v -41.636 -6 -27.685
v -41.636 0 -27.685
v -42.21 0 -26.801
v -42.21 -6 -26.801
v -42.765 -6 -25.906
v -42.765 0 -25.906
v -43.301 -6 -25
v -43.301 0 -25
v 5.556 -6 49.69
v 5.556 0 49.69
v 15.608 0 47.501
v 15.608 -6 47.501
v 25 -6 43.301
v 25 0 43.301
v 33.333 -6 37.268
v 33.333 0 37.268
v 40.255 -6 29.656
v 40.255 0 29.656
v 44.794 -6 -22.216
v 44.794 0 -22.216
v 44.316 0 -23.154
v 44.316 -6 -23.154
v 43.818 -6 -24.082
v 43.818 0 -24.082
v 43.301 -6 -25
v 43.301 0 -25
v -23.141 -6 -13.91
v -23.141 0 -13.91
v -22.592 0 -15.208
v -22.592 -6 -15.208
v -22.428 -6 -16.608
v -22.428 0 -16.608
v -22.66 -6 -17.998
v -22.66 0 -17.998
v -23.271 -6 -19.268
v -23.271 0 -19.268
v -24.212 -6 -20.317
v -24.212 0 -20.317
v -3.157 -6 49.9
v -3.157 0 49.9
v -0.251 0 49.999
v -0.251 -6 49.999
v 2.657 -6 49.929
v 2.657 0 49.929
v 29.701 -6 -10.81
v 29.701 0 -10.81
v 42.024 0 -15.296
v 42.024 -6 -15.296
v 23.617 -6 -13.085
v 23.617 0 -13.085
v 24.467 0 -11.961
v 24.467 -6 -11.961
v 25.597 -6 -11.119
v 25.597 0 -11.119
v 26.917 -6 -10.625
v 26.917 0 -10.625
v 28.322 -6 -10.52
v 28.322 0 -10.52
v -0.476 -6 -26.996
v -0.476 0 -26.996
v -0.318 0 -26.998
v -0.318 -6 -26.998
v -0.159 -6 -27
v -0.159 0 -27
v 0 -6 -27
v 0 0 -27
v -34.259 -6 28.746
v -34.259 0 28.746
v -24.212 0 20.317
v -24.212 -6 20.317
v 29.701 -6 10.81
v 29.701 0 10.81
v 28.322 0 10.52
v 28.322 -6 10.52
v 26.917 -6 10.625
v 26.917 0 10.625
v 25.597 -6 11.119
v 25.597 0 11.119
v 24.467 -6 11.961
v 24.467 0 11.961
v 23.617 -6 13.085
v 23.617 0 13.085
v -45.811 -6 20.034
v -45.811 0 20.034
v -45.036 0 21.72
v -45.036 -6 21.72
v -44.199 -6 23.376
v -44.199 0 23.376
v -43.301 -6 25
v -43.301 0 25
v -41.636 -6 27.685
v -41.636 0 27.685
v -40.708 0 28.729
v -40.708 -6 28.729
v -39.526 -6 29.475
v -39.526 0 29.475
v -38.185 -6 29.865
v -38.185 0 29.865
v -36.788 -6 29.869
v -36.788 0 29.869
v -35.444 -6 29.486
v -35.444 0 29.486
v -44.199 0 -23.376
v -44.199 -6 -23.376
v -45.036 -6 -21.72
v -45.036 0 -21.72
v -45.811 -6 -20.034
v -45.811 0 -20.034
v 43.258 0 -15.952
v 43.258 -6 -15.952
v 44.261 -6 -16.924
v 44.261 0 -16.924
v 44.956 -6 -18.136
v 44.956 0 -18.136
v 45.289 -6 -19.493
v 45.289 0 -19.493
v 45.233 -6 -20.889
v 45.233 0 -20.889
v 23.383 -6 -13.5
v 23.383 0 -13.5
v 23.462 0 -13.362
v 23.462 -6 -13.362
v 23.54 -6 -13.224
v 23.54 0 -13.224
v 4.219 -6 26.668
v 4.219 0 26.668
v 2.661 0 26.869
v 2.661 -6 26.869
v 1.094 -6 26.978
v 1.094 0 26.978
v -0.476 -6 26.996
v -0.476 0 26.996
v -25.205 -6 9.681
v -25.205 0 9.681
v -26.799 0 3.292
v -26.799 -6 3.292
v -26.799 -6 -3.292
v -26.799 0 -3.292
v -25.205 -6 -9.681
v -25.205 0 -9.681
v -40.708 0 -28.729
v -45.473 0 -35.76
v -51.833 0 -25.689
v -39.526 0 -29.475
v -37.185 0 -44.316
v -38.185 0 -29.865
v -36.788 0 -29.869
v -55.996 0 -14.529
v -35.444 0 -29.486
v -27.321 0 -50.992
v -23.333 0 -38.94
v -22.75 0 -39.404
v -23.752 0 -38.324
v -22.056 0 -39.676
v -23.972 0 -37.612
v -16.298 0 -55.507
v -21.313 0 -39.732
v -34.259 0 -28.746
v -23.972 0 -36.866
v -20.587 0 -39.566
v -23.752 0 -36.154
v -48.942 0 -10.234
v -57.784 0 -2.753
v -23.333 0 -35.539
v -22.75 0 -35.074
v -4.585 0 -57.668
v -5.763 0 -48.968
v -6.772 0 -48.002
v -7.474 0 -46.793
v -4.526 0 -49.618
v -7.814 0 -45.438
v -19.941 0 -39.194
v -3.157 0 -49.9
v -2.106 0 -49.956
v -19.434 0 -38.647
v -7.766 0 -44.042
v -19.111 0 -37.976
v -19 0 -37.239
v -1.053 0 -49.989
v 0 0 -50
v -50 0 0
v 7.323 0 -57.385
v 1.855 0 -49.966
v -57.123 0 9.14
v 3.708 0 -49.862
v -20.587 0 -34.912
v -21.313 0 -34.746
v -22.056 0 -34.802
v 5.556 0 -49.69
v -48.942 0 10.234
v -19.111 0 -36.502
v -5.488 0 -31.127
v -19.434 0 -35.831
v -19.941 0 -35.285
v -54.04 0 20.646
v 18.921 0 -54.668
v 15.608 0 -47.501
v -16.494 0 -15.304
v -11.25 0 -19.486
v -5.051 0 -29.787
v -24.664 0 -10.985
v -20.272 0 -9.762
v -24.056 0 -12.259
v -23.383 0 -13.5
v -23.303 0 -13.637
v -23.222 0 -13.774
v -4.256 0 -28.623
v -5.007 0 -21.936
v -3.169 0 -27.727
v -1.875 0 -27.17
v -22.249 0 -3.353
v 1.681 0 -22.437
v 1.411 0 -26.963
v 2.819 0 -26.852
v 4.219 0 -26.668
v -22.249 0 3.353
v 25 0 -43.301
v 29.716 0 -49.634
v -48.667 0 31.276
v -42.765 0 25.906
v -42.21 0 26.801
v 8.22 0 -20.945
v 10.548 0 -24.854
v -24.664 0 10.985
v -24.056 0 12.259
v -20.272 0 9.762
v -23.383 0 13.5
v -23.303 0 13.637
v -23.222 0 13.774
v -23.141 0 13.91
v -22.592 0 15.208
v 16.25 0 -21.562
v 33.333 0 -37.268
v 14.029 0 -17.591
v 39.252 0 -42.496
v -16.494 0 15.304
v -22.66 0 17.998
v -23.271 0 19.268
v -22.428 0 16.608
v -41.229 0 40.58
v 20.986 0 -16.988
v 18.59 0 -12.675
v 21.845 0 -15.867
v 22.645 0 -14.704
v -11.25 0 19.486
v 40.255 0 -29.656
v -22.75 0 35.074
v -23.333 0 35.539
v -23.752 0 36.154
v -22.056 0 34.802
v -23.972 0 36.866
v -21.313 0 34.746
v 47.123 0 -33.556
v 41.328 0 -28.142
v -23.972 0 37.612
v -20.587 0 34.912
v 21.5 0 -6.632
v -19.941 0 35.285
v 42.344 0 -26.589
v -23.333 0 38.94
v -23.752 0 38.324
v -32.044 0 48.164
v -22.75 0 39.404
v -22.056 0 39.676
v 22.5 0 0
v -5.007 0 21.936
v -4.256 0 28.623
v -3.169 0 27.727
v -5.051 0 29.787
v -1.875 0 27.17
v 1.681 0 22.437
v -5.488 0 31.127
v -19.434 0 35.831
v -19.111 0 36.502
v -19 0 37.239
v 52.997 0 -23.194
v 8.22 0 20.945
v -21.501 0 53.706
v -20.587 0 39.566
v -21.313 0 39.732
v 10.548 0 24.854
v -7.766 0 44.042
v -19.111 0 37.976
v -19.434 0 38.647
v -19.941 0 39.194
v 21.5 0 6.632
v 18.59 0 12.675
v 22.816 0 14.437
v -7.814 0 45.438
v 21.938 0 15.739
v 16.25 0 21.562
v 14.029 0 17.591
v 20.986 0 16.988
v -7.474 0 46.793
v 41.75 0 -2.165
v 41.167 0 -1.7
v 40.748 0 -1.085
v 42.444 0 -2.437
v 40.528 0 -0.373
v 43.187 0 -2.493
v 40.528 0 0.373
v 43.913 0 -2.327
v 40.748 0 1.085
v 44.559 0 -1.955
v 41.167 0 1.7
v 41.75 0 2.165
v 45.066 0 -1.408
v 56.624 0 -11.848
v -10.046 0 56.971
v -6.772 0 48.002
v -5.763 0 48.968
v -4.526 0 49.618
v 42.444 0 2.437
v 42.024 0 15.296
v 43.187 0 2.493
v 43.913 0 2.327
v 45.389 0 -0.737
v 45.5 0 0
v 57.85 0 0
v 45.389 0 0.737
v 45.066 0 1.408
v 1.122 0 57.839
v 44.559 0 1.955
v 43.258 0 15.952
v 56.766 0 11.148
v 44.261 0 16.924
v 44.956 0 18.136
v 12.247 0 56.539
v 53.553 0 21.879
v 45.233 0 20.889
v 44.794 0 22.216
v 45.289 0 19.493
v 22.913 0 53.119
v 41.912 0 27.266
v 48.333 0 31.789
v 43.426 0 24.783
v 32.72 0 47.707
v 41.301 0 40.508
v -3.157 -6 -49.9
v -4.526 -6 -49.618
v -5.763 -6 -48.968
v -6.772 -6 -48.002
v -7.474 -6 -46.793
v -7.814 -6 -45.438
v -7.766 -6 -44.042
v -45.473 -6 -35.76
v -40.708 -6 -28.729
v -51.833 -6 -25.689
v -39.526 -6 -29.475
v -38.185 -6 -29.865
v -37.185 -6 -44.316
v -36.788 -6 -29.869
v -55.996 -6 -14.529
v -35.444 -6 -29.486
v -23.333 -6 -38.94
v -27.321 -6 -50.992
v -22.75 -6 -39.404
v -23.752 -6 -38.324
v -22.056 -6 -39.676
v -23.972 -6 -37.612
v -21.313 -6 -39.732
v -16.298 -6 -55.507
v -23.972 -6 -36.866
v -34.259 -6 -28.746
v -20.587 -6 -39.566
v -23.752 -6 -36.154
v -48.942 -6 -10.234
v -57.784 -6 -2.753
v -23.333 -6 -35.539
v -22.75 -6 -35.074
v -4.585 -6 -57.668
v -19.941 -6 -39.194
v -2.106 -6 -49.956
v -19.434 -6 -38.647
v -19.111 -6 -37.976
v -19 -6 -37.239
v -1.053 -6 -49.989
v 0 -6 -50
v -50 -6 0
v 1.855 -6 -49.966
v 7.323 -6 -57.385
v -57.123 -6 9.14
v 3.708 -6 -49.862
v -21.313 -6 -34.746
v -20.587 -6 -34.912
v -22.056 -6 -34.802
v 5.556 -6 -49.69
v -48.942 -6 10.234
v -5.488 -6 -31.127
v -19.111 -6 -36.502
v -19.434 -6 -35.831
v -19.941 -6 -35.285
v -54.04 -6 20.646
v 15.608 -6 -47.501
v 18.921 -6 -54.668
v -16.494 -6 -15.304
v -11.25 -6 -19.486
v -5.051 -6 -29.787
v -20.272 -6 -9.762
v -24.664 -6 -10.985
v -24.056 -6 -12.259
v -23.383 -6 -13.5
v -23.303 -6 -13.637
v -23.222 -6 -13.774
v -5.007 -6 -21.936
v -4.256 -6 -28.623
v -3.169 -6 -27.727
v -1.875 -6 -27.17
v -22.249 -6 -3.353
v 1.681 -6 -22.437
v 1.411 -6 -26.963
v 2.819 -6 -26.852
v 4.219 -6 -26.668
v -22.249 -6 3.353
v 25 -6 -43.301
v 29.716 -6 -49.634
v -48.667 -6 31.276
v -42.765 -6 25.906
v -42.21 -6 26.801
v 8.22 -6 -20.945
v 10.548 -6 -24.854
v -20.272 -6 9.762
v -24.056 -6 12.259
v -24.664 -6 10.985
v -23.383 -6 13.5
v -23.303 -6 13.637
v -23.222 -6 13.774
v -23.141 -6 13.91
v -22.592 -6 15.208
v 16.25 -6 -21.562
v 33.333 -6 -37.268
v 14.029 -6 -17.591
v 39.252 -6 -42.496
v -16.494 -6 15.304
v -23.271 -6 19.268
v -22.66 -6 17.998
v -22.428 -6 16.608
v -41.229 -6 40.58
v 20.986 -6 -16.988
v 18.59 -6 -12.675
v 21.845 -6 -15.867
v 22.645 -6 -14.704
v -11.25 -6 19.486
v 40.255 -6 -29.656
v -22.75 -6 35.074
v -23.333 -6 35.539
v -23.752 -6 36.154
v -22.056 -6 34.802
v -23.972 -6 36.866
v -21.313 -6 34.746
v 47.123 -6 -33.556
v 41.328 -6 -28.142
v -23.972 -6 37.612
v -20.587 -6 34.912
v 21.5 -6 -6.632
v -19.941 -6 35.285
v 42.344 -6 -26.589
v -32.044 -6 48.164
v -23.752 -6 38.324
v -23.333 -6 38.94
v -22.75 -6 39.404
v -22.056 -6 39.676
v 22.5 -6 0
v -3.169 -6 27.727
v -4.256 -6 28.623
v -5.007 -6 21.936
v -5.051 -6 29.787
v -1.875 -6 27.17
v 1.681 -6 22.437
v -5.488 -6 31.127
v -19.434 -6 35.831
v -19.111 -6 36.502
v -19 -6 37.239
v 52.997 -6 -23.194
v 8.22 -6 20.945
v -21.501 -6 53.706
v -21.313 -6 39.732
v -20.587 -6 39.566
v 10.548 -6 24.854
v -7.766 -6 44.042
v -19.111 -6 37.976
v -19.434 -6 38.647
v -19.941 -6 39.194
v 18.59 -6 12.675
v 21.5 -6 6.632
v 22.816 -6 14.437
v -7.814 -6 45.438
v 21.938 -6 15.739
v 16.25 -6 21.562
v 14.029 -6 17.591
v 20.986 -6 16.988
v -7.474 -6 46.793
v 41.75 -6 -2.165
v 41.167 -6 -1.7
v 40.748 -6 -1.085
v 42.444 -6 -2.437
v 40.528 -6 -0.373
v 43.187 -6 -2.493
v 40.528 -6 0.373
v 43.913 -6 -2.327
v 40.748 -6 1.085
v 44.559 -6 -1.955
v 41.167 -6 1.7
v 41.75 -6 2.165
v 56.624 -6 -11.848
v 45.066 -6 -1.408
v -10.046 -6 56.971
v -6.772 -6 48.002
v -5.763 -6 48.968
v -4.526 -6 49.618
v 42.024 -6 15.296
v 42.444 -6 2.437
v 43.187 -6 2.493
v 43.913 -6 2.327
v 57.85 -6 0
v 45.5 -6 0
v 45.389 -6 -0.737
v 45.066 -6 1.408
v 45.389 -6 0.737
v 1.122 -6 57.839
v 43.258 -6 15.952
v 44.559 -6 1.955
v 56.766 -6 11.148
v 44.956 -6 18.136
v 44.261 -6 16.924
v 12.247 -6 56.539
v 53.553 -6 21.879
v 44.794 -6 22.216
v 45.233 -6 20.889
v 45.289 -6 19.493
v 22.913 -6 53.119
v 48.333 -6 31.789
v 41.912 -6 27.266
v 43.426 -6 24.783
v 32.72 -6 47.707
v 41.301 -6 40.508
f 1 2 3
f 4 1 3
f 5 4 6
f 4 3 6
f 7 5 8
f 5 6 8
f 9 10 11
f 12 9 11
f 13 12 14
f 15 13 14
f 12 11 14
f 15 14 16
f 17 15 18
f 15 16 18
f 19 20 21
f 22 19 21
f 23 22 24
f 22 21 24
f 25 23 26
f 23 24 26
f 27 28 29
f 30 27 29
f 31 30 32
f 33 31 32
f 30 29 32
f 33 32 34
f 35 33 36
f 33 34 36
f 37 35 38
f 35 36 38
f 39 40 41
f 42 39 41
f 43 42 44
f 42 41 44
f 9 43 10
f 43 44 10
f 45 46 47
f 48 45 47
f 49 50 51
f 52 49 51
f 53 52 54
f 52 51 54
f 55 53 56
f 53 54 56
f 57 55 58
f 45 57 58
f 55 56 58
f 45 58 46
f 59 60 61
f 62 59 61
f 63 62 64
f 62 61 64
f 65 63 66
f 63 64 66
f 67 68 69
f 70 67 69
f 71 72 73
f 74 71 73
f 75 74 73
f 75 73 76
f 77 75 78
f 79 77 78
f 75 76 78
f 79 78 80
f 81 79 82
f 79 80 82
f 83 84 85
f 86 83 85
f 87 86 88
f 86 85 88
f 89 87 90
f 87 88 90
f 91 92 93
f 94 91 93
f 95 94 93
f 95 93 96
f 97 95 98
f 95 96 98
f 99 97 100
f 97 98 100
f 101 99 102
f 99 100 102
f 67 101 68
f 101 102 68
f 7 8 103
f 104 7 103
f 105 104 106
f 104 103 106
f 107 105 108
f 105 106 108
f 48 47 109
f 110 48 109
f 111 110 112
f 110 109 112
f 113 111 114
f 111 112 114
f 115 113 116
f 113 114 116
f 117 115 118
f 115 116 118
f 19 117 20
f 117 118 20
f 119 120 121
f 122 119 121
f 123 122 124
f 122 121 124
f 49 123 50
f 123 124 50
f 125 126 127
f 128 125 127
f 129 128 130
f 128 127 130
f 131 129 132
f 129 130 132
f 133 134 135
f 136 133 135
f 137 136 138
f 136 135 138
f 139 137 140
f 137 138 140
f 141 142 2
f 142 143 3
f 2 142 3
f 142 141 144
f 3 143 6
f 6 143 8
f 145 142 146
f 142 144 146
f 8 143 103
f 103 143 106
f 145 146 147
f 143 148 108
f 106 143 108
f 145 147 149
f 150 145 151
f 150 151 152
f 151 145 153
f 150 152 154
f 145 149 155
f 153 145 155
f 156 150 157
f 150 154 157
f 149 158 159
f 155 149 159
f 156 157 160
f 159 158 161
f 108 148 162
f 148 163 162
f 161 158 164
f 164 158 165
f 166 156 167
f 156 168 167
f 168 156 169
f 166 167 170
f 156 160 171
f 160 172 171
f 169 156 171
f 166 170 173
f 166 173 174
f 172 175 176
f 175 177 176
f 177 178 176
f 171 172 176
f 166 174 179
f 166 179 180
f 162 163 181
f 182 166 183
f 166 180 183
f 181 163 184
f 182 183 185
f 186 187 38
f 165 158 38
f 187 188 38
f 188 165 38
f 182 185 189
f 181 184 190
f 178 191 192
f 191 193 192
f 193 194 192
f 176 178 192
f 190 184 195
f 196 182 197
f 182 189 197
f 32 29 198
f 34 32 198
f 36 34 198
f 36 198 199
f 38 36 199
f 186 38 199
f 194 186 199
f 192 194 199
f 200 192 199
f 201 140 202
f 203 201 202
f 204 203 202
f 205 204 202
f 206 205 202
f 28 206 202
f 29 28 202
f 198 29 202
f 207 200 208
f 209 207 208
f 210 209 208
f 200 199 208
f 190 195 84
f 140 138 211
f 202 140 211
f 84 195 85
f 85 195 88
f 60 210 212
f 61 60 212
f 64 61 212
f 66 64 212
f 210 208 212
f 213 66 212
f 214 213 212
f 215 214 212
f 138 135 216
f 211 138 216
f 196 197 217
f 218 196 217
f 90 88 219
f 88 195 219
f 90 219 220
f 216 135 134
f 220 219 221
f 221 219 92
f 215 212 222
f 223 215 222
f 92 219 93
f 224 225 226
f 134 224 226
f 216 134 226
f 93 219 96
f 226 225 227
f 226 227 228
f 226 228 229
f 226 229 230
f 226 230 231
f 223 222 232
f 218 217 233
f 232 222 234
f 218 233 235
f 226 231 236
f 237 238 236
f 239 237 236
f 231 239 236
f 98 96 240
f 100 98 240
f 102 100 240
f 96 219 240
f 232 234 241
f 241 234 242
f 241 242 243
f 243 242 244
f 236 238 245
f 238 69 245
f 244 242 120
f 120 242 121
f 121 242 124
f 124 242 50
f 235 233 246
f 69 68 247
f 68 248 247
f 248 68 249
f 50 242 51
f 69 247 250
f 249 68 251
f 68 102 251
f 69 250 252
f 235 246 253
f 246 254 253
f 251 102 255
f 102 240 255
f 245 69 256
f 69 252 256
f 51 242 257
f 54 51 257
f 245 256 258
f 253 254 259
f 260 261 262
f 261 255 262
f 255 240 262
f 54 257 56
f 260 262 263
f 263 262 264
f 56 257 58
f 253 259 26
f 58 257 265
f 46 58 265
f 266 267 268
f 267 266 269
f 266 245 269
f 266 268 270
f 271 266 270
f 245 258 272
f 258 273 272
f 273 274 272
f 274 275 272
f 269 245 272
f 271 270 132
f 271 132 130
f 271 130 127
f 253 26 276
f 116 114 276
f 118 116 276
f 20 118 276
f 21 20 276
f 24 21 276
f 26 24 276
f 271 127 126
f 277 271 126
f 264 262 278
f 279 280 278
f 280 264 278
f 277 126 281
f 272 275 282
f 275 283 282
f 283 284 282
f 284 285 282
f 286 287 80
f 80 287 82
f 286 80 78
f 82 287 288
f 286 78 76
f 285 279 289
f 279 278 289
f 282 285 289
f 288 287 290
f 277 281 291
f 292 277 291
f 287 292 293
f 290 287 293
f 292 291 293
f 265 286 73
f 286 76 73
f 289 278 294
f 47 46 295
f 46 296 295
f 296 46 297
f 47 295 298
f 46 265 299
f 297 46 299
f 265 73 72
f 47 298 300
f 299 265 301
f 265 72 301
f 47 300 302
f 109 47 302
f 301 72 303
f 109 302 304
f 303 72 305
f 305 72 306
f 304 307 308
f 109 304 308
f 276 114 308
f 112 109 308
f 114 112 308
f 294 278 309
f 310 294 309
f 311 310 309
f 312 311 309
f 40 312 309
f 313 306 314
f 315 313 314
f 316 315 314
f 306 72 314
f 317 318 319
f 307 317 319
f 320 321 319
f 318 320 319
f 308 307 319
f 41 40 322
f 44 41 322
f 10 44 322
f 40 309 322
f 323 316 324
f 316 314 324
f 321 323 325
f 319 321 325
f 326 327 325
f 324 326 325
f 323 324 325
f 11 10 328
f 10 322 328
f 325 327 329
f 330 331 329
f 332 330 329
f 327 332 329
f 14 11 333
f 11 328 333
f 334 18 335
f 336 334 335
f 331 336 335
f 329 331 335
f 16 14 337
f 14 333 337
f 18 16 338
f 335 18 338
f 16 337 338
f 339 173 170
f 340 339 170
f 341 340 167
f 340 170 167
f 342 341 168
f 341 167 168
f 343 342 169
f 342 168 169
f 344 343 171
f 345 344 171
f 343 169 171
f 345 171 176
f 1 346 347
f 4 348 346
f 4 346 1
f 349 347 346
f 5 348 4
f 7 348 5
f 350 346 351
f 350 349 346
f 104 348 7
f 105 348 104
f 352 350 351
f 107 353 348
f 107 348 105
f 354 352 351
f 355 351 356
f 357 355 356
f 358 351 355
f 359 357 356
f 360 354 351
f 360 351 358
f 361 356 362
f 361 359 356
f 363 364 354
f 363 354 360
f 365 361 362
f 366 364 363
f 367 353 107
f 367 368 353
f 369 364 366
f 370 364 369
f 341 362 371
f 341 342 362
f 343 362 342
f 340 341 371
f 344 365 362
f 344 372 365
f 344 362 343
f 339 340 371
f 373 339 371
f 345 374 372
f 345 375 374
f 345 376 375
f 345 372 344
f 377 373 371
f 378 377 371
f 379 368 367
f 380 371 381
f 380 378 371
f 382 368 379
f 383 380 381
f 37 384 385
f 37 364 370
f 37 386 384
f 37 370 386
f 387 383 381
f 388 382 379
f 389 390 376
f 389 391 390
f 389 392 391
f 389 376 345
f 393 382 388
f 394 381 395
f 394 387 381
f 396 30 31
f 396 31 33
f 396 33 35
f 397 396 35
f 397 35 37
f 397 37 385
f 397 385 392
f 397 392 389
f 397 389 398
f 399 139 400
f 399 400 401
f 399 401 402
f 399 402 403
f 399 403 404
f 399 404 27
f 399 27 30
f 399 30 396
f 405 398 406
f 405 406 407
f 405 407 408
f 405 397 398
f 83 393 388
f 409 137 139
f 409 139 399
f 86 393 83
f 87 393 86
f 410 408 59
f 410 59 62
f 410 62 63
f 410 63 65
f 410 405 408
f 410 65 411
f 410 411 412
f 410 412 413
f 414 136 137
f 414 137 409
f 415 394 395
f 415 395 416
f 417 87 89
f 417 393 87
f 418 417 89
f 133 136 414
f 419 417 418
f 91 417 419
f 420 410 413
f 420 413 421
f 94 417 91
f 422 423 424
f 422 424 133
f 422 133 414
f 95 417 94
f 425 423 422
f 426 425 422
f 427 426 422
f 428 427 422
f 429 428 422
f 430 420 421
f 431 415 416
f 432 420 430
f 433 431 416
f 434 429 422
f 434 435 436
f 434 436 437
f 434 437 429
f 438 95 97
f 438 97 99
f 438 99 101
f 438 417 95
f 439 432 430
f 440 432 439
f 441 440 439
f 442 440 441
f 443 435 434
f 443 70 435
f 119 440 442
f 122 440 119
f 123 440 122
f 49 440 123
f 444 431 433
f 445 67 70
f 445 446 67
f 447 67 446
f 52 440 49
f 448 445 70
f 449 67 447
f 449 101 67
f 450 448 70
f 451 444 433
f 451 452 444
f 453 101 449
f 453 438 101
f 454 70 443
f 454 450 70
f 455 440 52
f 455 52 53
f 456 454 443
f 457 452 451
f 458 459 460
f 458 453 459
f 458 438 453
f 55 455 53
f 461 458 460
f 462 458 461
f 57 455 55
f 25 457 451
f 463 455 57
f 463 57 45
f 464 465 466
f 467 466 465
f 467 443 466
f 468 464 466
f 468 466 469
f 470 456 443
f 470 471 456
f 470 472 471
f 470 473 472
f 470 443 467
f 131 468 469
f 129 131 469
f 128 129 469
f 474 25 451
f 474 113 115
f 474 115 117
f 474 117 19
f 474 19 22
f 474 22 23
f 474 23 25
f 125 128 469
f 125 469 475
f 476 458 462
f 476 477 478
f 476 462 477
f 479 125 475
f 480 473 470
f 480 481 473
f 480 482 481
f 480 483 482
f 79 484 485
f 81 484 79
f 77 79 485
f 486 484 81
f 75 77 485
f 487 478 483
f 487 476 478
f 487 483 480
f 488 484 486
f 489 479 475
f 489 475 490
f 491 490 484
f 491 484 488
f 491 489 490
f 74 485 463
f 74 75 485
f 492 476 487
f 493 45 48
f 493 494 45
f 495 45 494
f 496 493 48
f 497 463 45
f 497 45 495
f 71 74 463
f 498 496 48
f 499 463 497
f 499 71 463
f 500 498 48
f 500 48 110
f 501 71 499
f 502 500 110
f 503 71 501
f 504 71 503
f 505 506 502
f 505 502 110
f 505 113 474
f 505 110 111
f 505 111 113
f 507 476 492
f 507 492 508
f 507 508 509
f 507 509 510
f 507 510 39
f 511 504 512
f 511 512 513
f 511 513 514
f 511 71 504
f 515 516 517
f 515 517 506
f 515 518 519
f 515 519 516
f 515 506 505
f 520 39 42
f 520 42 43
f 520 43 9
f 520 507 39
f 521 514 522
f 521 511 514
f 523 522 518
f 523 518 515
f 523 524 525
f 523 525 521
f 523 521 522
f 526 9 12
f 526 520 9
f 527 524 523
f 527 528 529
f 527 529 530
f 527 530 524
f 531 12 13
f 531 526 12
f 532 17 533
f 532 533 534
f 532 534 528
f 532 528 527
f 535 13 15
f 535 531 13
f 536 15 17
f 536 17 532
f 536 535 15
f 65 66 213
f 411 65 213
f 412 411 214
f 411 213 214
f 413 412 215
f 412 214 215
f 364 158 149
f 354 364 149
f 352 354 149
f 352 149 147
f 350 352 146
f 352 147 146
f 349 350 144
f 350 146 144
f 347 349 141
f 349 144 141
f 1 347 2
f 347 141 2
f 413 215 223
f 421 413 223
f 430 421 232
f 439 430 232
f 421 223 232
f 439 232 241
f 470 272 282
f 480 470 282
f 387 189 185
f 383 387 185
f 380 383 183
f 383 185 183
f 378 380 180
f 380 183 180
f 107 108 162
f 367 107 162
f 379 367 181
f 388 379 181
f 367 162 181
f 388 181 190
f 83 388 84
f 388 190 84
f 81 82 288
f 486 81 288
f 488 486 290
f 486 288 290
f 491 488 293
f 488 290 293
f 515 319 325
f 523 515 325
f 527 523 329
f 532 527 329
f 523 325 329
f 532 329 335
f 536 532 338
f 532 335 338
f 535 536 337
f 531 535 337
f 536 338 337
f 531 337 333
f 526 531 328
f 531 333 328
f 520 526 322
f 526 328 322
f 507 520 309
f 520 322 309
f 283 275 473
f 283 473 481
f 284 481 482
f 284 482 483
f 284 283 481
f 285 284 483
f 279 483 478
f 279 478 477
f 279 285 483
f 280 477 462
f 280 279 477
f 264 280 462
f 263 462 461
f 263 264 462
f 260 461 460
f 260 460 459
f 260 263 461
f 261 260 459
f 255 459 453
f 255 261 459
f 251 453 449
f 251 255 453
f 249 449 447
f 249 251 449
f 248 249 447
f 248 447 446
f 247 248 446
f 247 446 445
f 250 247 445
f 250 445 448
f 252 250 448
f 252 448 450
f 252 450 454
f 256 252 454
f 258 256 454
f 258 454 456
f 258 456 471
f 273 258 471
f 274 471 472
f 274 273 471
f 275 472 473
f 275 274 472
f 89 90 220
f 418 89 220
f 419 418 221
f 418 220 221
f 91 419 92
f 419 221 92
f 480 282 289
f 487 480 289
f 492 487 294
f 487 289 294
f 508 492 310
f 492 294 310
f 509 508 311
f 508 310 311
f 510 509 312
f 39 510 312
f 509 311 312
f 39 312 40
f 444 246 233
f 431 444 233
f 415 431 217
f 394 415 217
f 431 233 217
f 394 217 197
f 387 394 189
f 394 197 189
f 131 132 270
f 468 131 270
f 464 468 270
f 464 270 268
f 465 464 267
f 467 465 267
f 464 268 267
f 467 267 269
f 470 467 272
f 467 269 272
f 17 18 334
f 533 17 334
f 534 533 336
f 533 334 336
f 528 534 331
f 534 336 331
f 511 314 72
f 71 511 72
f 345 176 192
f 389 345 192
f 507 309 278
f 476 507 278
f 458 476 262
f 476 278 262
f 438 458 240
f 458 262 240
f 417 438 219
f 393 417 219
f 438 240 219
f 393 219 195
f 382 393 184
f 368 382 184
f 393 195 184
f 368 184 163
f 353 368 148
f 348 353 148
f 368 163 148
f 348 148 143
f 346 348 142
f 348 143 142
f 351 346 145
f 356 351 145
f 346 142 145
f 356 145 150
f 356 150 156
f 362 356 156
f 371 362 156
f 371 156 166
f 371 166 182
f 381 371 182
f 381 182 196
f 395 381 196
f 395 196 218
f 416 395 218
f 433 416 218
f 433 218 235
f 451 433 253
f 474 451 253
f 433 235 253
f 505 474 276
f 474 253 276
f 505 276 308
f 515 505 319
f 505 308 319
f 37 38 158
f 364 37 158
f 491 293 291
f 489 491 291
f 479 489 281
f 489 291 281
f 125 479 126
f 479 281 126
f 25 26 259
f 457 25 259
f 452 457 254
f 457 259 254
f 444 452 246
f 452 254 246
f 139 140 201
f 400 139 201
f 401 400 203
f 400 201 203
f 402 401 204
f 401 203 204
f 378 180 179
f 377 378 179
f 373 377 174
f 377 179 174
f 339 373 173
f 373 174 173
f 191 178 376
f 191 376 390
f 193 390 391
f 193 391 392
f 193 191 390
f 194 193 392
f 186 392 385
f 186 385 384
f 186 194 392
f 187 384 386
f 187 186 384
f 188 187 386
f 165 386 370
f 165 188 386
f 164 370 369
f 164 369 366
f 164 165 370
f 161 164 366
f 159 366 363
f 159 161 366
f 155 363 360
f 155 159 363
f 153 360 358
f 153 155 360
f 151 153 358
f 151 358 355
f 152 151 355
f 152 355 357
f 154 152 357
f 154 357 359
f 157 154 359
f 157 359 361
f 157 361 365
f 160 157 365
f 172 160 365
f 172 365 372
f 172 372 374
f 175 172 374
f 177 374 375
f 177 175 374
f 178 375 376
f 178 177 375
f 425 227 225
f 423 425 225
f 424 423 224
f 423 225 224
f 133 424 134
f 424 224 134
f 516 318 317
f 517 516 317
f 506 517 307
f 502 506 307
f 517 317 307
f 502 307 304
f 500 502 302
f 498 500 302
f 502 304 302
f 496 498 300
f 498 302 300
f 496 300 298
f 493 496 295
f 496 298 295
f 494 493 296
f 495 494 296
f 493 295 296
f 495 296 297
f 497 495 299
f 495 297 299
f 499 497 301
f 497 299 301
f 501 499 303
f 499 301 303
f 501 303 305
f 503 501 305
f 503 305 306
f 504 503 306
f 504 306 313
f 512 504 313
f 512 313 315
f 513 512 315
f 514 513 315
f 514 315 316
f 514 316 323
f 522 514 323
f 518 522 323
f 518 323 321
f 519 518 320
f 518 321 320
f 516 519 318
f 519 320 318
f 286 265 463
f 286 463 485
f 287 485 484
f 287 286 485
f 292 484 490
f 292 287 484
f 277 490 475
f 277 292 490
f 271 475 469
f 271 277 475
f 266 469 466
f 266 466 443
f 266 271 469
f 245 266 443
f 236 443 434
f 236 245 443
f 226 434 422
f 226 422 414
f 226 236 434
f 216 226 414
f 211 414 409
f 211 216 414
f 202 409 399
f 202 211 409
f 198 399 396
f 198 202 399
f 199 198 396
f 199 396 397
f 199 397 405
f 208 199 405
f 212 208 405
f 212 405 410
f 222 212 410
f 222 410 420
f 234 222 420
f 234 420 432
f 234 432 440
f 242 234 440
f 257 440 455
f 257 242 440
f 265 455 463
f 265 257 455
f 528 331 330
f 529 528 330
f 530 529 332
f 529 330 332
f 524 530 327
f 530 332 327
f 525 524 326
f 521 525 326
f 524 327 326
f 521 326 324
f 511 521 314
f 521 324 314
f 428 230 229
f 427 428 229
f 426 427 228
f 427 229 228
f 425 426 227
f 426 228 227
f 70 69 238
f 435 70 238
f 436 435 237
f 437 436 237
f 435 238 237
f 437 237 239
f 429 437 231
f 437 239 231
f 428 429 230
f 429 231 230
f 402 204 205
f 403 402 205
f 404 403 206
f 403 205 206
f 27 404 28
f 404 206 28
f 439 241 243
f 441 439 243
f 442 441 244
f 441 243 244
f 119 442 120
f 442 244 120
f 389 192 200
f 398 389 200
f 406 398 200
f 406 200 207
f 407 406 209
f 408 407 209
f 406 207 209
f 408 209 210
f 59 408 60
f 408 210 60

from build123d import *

# Parameters (mm, degrees)
F0_R     = 2.5
F0_R_2   = 22.5
F1_DEPTH = 6


with BuildPart() as f1:
    # F0 (on Front) → F1 (new body)
    with BuildSketch(Plane.XZ):
        with BuildLine():
            ThreePointArc((-10.045547, 56.971129), (-37.185263, -44.315671), (57.85, 0))
            ThreePointArc((57.85, 0), (37.185263, 44.315671), (-10.045547, 56.971129))
        make_face()
        with Locations((-21.5, -37.239092)):
            Circle(F0_R, mode=Mode.SUBTRACT)
        with BuildLine():
            ThreePointArc((-23.382686, 13.5), (-24.368717, 11.626075), (-25.204864, 9.680642))
            ThreePointArc((-25.204864, 9.680642), (-27, 0), (-25.204864, -9.680642))
            ThreePointArc((-25.204864, -9.680642), (-24.368717, -11.626075), (-23.382686, -13.5))
            ThreePointArc((-23.382686, -13.5), (-23.262708, -13.705708), (-23.14092, -13.91035))
            ThreePointArc((-23.14092, -13.91035), (-22.49477, -17.311118), (-24.212337, -20.316563))
            Line((-24.212337, -20.316563), (-34.258549, -28.746336))
            ThreePointArc((-34.258549, -28.746336), (-38.184741, -29.865123), (-41.636097, -27.684571))
            ThreePointArc((-41.636097, -27.684571), (-42.489891, -26.35544), (-43.30127, -25))
            ThreePointArc((-43.30127, -25), (-44.625232, -22.551911), (-45.810926, -20.033948))
            ThreePointArc((-45.810926, -20.033948), (-50, 0), (-45.810926, 20.033948))
            ThreePointArc((-45.810926, 20.033948), (-44.625232, 22.551911), (-43.30127, 25))
            ThreePointArc((-43.30127, 25), (-42.489891, 26.35544), (-41.636097, 27.684571))
            ThreePointArc((-41.636097, 27.684571), (-38.184741, 29.865123), (-34.258549, 28.746336))
            Line((-34.258549, 28.746336), (-24.212337, 20.316563))
            ThreePointArc((-24.212337, 20.316563), (-22.49477, 17.311118), (-23.14092, 13.91035))
            ThreePointArc((-23.14092, 13.91035), (-23.262708, 13.705708), (-23.382686, 13.5))
        make_face(mode=Mode.SUBTRACT)
        Circle(F0_R_2, mode=Mode.SUBTRACT)
        with BuildLine():
            ThreePointArc((4.21875, -26.668374), (13.5, -23.382686), (20.986114, -16.987731))
            ThreePointArc((20.986114, -16.987731), (22.252835, -15.29089), (23.382686, -13.5))
            ThreePointArc((23.382686, -13.5), (23.500845, -13.293242), (23.617176, -13.085449))
            ThreePointArc((23.617176, -13.085449), (26.239253, -10.825483), (29.700828, -10.810217))
            Line((29.700828, -10.810217), (42.024332, -15.295606))
            ThreePointArc((42.024332, -15.295606), (44.956326, -18.136394), (44.79359, -22.215632))
            ThreePointArc((44.79359, -22.215632), (44.069426, -23.619605), (43.30127, -25))
            ThreePointArc((43.30127, -25), (41.843144, -27.370629), (40.255371, -29.656452))
            ThreePointArc((40.255371, -29.656452), (25, -43.30127), (5.555556, -49.690399))
            ThreePointArc((5.555556, -49.690399), (2.782088, -49.92254), (0, -50))
            ThreePointArc((0, -50), (-1.579535, -49.975044), (-3.157493, -49.900203))
            ThreePointArc((-3.157493, -49.900203), (-6.771585, -48.001517), (-7.765783, -44.041942))
            Line((-7.765783, -44.041942), (-5.488491, -31.12678))
            ThreePointArc((-5.488491, -31.12678), (-3.744483, -28.136601), (-0.476257, -26.995799))
            ThreePointArc((-0.476257, -26.995799), (-0.238138, -26.99895), (0, -27))
            ThreePointArc((0, -27), (2.115882, -26.916966), (4.21875, -26.668374))
        make_face(mode=Mode.SUBTRACT)
        with BuildLine():
            ThreePointArc((40.5, 0), (43, 2.5), (45.5, 0))
            ThreePointArc((45.5, 0), (43, -2.5), (40.5, 0))
        make_face(mode=Mode.SUBTRACT)
        with Locations((-21.5, 37.239092)):
            Circle(F0_R, mode=Mode.SUBTRACT)
        with BuildLine():
            ThreePointArc((20.986114, 16.987731), (13.5, 23.382686), (4.21875, 26.668374))
            ThreePointArc((4.21875, 26.668374), (1.878394, 26.934581), (-0.476257, 26.995799))
            ThreePointArc((-0.476257, 26.995799), (-3.744483, 28.136601), (-5.488491, 31.12678))
            Line((-5.488491, 31.12678), (-7.765783, 44.041942))
            ThreePointArc((-7.765783, 44.041942), (-6.771585, 48.001517), (-3.157493, 49.900203))
            ThreePointArc((-3.157493, 49.900203), (1.203611, 49.985511), (5.555556, 49.690399))
            ThreePointArc((5.555556, 49.690399), (25, 43.30127), (40.255371, 29.656452))
            ThreePointArc((40.255371, 29.656452), (42.686917, 26.035114), (44.79359, 22.215632))
            ThreePointArc((44.79359, 22.215632), (44.956326, 18.136394), (42.024332, 15.295606))
            Line((42.024332, 15.295606), (29.700828, 10.810217))
            ThreePointArc((29.700828, 10.810217), (26.239253, 10.825483), (23.617176, 13.085449))
            ThreePointArc((23.617176, 13.085449), (22.386834, 15.094028), (20.986114, 16.987731))
        make_face(mode=Mode.SUBTRACT)
    extrude(amount=F1_DEPTH)


solid = f1.part
